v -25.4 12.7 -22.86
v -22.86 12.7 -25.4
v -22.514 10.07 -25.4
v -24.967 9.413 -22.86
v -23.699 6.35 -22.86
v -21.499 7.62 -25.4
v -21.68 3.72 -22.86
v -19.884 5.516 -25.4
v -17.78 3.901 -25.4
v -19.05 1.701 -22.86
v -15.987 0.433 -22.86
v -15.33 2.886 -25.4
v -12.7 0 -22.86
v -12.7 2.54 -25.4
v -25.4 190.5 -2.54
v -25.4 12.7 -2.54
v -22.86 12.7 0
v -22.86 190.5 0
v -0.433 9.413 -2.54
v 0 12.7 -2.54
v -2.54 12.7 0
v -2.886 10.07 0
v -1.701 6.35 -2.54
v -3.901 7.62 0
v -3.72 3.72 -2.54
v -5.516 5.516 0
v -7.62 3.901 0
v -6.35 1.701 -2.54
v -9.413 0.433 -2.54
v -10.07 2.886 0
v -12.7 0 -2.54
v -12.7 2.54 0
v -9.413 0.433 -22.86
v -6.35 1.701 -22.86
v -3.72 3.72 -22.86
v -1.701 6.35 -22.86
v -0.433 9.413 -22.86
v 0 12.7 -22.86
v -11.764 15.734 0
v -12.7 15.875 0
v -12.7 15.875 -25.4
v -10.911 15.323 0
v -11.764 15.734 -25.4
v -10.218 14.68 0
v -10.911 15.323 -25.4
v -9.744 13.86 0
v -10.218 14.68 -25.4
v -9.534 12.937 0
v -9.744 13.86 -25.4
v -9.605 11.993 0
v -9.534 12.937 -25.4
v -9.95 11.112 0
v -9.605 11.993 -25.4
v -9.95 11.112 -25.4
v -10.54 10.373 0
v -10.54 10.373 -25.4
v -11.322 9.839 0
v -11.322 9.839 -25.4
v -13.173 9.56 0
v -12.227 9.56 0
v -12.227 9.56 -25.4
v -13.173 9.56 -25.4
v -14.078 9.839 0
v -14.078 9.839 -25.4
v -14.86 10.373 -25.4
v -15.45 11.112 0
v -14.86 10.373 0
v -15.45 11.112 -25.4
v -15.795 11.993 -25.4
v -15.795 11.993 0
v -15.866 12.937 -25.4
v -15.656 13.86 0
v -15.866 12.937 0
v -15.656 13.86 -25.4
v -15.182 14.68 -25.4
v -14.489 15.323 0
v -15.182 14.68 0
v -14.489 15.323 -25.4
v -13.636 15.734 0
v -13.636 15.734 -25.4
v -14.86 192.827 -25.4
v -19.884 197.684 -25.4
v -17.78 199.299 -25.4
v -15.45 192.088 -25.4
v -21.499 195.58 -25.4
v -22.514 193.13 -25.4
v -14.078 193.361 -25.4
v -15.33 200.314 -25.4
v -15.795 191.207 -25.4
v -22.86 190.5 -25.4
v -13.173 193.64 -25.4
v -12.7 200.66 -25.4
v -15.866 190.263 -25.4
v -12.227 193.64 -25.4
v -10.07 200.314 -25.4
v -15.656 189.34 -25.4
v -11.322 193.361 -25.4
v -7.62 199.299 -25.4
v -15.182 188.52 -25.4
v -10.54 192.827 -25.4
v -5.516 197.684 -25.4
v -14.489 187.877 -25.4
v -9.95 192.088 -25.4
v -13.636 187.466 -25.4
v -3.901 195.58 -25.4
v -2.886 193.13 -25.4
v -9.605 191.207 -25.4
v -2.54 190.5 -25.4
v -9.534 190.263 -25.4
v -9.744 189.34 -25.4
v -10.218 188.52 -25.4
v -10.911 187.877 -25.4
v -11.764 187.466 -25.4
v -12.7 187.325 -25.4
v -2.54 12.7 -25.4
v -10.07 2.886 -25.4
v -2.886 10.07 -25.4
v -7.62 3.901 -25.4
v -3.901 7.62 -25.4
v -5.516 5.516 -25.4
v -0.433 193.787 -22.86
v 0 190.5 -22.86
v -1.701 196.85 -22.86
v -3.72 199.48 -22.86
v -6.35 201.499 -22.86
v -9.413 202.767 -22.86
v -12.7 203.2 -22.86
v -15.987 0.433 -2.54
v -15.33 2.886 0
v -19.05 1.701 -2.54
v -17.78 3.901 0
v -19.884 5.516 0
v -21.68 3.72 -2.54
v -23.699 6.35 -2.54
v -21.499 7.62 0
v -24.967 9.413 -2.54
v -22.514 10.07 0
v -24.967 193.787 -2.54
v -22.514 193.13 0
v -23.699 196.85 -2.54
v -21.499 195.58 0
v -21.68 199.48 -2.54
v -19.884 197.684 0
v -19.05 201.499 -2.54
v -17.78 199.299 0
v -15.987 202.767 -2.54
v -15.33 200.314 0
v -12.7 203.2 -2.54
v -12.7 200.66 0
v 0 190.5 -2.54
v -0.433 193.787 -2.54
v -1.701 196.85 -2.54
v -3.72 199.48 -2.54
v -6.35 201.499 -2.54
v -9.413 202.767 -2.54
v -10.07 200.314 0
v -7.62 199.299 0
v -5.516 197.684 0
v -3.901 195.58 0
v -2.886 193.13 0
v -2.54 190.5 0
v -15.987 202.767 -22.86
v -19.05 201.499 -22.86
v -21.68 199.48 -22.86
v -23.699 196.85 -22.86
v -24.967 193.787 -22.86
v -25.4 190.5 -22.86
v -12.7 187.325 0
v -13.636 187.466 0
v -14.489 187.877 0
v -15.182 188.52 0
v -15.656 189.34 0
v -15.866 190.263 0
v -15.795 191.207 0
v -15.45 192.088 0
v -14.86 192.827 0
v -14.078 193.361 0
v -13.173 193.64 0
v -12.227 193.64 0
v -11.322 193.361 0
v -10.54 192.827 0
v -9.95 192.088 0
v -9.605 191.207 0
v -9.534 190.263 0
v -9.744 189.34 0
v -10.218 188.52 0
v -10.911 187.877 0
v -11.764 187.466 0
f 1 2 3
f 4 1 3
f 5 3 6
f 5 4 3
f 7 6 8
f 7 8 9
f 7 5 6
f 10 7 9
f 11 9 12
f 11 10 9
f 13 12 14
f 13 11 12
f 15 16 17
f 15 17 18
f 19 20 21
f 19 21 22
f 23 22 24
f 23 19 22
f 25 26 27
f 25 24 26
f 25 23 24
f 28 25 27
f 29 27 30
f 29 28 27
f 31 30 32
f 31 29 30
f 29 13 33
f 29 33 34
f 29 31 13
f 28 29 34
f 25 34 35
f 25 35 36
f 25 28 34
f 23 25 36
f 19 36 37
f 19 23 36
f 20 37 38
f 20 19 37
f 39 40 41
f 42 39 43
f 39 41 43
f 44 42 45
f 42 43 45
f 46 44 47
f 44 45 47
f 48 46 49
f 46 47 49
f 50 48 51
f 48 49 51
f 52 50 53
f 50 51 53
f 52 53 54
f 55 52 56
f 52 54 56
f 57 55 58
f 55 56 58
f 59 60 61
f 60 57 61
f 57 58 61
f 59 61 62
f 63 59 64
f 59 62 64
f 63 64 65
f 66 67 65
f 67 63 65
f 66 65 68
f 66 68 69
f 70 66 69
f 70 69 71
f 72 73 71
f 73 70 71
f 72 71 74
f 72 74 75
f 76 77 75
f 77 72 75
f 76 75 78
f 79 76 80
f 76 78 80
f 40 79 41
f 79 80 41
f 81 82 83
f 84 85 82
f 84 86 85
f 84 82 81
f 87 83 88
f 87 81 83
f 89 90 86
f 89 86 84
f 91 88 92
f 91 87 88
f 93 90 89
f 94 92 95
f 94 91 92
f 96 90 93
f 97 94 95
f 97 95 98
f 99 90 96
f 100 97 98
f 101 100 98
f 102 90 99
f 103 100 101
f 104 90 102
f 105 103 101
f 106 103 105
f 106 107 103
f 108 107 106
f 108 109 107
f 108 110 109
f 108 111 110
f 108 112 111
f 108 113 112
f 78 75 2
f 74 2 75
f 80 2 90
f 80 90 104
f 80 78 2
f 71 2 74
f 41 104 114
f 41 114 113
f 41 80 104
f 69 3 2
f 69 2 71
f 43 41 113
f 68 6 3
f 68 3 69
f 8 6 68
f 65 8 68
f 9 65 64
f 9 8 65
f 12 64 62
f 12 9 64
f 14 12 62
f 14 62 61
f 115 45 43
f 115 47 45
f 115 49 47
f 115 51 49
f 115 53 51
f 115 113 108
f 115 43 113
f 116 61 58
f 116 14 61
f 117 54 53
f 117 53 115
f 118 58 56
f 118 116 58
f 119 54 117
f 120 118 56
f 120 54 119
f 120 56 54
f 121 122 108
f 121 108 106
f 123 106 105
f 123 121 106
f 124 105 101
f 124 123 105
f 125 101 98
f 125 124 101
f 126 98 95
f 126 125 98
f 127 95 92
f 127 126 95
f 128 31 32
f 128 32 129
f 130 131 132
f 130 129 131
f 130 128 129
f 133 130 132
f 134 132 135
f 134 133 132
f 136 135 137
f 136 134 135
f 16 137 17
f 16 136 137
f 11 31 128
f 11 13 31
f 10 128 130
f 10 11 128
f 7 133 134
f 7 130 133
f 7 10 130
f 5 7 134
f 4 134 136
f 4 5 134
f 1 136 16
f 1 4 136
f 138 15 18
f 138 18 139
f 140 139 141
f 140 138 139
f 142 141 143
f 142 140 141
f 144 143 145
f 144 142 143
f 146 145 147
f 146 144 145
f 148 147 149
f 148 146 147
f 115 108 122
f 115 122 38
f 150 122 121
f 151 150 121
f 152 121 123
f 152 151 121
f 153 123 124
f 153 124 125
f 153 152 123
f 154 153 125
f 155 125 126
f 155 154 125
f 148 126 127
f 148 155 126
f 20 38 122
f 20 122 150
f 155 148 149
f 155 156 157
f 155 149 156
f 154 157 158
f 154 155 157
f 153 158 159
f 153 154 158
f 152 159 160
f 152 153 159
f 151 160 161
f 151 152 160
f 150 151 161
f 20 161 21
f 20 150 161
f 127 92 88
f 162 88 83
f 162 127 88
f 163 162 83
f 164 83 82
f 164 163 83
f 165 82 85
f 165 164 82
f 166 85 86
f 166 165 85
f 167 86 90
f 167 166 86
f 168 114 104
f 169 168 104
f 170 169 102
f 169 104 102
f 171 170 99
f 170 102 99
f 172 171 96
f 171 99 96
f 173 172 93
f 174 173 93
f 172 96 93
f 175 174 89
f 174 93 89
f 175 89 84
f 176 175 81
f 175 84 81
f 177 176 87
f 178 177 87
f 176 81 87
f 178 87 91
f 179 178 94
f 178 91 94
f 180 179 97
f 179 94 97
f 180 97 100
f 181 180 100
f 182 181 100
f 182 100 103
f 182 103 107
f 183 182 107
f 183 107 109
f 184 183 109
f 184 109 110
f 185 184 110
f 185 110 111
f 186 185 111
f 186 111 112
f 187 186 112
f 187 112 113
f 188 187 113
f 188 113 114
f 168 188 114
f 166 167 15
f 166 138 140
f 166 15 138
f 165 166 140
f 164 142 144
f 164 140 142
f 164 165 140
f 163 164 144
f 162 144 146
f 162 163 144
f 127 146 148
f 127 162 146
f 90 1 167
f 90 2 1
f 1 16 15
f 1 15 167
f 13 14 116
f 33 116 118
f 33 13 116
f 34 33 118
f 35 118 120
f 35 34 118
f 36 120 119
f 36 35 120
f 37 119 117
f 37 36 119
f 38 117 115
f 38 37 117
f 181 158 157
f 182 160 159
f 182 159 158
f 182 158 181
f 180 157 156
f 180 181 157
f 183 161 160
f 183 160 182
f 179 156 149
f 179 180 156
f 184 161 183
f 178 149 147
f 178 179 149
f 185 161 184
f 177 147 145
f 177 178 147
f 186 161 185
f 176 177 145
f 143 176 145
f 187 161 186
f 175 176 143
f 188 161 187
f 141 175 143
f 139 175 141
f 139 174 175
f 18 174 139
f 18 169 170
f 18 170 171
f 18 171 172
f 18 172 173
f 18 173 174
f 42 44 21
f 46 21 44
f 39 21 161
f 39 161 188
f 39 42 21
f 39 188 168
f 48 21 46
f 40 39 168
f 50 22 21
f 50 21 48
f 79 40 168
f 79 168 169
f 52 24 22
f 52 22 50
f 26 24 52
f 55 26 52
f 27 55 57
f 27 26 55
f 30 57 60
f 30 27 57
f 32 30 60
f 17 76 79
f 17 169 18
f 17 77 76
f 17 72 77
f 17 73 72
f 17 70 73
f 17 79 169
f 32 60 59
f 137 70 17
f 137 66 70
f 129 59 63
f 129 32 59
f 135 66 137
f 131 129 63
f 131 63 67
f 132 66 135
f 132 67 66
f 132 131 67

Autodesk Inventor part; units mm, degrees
ref_plane "YZ Plane" through (0, 0, 0) normal (1, 0, 0) x (0, 1, 0)
ref_plane "XZ Plane" through (0, 0, 0) normal (0, 1, 0) x (-1, 0, 0)
sketch "Sketch1" plane through (0, 0, 0) normal (0, 1, 0) x (-1, 0, 0)
  line L0 (0, 0) -> (25.4, 0)
  line L1 (25.4, 0) -> (25.4, -25.4)
  line L2 (25.4, -25.4) -> (0, -25.4)
  line L3 (0, -25.4) -> (0, 0)
  dimension "d0" = 25.4
  dimension "d1" = 25.4
extrude "Extrusion1" add sketch "Sketch1" along normal blind 203.2
hole "Hole1" at (-12.7, 190.5, 0) direction (0, 0, -1) diameter 6.35 end through all
ref_plane "Work Plane1" through (0, 101.6, 0) normal (0, 1, 0) x (1, 0, 0)
mirror "Mirror1" about plane through (0, 101.6, 0) normal (0, 1, 0) of "Hole1"
fillet "Fillet1" radius 12.7 4 edges at (0, 203.2, -12.7) (-25.4, 203.2, -12.7) (0, 0, -12.7) (-25.4, 0, -12.7)
chamfer "Chamfer1" distance 2.54 angle 45 8 edges at (0, 101.6, 0) (-3.7197, 199.4803, 0) (-25.4, 101.6, 0) (-3.7197, 3.7197, 0) (0, 101.6, -25.4) (-3.7197, 199.4803, -25.4) (-25.4, 101.6, -25.4) (-3.7197, 3.7197, -25.4)
properties part number "shortBar"
